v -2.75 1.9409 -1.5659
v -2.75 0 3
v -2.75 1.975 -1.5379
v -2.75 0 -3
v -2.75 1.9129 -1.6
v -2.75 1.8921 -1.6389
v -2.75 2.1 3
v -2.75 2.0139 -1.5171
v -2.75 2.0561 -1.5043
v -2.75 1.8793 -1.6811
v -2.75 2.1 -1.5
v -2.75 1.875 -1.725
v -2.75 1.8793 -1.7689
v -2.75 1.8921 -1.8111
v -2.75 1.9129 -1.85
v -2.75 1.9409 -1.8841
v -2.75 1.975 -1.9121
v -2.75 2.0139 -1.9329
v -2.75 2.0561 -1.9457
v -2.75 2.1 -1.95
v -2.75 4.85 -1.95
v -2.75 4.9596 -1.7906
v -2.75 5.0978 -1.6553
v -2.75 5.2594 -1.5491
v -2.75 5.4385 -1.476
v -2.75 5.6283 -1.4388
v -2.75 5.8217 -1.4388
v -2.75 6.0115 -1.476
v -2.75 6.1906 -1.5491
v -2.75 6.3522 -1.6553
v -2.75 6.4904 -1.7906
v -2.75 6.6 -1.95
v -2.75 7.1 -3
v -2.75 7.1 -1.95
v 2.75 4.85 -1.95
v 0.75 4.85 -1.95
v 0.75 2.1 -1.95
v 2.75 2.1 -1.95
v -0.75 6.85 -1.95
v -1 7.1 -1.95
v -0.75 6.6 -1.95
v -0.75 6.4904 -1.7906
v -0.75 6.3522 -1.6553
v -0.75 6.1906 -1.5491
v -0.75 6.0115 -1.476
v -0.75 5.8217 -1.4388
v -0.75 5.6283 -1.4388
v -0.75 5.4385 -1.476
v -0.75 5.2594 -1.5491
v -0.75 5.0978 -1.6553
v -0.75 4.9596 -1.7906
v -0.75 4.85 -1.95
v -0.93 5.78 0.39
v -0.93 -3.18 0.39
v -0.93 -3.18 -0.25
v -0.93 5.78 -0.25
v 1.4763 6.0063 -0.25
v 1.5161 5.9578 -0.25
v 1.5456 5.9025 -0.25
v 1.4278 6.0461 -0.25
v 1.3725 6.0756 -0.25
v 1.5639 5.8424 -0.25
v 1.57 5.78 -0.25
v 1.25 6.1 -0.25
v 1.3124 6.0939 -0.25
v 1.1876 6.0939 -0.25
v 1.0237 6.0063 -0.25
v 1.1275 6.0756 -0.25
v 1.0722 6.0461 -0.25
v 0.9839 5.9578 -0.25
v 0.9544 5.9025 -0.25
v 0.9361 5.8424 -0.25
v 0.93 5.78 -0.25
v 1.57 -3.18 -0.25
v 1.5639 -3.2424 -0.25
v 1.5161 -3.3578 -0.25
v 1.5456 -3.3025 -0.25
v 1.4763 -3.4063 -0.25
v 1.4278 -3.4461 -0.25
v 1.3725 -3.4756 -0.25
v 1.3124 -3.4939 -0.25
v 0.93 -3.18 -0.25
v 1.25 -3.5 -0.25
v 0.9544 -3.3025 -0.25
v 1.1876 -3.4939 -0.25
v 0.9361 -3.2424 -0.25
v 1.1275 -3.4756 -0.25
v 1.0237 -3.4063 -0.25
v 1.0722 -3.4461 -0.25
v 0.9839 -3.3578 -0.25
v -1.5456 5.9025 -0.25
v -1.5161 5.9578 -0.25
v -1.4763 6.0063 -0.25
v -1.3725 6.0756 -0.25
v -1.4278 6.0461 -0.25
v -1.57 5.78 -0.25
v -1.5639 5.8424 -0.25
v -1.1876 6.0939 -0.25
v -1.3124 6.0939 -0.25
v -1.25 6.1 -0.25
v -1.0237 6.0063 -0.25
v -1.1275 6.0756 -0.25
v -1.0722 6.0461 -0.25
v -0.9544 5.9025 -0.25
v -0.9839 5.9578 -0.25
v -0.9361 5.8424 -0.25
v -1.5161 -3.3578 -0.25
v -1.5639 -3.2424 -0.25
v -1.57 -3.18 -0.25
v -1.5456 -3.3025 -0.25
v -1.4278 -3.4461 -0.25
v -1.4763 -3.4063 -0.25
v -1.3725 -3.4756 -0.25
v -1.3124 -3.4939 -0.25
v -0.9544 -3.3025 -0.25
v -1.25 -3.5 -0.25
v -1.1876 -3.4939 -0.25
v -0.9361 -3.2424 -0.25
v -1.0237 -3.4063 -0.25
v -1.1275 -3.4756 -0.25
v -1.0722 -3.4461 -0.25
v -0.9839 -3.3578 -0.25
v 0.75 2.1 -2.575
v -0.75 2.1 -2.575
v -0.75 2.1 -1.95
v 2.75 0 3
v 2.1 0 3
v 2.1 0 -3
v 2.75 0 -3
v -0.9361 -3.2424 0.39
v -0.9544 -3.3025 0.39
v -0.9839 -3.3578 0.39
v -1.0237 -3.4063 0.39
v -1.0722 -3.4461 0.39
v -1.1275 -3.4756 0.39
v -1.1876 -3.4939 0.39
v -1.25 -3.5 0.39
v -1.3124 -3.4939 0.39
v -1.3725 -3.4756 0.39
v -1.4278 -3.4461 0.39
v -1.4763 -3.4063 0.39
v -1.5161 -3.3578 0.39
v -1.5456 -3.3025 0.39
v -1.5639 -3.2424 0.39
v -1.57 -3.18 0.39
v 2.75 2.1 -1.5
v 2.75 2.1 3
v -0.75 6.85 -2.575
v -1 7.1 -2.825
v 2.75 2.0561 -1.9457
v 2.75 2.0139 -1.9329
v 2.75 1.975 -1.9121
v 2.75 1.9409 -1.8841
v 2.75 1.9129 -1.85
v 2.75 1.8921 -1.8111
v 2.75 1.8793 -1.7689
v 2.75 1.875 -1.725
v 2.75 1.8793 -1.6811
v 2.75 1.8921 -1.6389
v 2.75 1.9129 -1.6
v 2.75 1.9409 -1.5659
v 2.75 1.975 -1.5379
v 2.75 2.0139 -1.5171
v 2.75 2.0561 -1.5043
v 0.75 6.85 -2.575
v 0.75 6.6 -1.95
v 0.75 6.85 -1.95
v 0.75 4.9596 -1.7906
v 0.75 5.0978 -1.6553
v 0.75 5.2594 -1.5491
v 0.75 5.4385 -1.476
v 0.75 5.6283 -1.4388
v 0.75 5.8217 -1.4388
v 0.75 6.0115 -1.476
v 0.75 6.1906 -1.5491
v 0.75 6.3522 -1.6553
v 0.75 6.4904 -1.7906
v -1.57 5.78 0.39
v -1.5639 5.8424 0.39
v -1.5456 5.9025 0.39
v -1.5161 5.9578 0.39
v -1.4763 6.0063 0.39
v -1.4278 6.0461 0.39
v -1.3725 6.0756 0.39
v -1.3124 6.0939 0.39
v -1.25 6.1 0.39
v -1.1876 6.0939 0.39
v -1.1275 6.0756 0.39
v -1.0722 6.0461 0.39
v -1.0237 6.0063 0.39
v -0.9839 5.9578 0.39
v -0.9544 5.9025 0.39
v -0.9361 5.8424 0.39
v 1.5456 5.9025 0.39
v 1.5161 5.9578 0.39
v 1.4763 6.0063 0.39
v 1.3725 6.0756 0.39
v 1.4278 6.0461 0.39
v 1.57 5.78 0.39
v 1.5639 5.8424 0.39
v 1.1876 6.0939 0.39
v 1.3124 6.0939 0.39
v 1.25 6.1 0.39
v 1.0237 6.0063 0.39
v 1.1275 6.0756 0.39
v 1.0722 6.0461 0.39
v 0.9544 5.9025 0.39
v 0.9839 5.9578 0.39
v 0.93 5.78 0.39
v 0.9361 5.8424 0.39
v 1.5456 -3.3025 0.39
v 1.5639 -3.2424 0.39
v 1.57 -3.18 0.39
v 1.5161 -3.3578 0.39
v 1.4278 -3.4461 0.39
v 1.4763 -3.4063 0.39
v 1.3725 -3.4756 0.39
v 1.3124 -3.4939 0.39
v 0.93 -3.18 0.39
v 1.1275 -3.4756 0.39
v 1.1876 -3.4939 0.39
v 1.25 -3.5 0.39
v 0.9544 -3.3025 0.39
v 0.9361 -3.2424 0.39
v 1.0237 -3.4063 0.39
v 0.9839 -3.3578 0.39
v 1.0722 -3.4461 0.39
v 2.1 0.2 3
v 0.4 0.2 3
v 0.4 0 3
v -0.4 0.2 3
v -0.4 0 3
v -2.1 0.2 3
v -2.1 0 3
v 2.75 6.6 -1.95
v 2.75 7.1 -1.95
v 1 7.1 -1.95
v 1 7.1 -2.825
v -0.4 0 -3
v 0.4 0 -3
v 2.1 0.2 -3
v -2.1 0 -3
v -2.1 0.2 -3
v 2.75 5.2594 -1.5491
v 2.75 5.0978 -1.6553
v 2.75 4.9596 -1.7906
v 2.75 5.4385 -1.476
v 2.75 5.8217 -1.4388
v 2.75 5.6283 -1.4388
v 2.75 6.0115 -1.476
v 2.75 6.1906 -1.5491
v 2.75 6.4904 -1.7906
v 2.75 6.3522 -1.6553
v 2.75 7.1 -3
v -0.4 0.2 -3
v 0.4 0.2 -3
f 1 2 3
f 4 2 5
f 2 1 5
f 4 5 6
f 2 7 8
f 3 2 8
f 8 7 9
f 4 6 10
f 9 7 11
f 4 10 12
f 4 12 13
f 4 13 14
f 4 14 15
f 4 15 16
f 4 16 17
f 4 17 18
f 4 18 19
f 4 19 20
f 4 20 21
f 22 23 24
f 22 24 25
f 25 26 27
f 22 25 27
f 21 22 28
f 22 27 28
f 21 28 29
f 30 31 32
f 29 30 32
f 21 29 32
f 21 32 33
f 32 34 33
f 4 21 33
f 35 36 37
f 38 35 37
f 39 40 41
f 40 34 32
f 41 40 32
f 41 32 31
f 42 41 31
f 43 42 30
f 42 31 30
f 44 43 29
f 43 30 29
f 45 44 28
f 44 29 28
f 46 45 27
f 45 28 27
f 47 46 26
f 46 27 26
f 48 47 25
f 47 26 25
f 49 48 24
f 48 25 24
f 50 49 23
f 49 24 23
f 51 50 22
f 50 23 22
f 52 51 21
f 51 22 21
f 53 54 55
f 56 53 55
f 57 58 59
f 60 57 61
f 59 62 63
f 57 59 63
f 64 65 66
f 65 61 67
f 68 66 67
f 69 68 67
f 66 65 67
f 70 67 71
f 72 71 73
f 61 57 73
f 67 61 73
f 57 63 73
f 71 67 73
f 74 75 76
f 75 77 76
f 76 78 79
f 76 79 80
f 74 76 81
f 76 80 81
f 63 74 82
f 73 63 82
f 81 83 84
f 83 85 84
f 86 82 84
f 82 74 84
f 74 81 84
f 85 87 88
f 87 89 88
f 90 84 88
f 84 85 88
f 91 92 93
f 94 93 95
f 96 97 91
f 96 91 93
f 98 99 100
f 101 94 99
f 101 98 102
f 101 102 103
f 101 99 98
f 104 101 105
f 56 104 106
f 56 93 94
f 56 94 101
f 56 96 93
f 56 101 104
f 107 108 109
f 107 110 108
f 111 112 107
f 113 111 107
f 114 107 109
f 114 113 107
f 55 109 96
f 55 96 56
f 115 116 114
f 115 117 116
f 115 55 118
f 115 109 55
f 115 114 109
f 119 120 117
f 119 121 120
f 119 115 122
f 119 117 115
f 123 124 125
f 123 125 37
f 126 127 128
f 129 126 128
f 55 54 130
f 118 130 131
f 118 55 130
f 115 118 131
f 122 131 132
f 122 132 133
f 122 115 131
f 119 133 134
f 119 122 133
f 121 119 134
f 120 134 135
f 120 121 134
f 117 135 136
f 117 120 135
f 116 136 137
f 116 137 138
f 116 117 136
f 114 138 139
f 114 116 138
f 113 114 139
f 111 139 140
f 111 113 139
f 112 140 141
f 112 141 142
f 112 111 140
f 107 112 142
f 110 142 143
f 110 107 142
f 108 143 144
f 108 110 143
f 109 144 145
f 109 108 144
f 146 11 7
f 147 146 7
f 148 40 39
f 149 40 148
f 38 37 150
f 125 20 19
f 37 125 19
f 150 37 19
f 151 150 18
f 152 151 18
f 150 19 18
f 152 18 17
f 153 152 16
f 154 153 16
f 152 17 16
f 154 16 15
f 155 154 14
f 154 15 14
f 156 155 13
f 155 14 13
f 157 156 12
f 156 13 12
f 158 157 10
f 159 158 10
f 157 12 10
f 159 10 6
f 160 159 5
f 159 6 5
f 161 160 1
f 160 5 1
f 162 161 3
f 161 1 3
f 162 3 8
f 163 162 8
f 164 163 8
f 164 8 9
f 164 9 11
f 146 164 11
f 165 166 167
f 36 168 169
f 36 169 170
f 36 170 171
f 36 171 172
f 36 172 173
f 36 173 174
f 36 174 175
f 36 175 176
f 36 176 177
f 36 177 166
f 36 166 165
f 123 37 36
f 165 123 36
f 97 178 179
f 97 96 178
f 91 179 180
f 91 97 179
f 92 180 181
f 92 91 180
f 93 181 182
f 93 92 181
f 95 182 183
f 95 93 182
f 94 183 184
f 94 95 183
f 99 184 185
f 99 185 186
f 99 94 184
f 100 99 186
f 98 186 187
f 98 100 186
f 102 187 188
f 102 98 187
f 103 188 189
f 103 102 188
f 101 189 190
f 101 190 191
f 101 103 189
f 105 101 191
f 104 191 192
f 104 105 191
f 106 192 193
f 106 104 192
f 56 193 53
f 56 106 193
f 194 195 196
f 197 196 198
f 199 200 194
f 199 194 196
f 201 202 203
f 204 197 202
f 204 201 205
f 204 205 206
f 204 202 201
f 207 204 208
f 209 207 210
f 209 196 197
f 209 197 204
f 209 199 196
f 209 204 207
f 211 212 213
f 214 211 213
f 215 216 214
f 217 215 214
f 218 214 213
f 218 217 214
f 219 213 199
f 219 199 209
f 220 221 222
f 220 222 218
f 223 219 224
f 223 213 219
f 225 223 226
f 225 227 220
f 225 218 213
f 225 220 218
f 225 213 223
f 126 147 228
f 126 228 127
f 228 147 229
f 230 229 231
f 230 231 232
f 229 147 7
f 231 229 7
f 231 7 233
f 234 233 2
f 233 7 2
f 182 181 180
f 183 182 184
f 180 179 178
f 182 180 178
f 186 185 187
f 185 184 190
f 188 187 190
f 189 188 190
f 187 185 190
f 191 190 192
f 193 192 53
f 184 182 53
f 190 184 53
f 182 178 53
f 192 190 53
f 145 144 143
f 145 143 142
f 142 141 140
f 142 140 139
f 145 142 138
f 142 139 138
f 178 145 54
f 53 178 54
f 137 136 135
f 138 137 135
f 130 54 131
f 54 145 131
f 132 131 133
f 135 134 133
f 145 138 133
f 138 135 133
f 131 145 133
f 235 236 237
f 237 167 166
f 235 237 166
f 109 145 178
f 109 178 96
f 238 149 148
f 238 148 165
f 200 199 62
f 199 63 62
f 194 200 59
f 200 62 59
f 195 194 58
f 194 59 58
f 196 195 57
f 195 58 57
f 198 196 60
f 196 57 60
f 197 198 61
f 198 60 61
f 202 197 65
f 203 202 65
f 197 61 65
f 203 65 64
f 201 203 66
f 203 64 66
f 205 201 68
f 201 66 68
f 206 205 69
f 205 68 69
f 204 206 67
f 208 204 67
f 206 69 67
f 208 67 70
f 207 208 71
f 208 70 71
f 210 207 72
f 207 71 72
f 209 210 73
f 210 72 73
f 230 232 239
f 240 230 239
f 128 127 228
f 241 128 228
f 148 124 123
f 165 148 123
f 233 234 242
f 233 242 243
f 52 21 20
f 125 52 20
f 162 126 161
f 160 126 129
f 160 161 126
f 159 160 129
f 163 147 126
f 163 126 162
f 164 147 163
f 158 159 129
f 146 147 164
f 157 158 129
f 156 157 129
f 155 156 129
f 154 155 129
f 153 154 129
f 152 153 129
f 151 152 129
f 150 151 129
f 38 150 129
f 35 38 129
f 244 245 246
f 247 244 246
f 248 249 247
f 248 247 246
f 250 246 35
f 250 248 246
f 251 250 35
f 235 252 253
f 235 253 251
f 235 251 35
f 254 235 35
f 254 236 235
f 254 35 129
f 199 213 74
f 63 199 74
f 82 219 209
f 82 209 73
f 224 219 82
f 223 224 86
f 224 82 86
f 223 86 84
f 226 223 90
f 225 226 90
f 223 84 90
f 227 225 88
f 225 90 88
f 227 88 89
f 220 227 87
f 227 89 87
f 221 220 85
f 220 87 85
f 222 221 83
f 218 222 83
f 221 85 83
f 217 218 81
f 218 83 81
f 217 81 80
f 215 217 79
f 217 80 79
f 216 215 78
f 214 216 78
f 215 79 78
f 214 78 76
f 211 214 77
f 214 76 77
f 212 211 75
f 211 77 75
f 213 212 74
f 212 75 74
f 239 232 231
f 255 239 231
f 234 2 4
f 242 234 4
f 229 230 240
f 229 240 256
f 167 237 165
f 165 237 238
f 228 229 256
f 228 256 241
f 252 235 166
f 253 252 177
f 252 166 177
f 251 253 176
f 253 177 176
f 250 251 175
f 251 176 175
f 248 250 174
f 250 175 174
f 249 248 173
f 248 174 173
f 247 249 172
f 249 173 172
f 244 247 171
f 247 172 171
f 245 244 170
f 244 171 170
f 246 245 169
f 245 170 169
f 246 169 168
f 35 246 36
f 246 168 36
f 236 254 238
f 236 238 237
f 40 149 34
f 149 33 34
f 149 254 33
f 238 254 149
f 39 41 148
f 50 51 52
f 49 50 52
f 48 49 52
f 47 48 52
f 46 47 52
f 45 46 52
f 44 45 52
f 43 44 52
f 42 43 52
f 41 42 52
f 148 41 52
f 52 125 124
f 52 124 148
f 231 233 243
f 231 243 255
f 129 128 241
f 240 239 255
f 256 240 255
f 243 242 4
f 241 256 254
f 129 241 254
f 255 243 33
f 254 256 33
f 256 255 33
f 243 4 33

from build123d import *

# Parameters (mm, degrees)
BOSS_EXTRUDE1_DEPTH      = 2.75
BOSS_EXTRUDE1_DEPTH_BACK = 2.75
SKETCH2_W                = 1.5
SKETCH2_H                = 1.25
CUT_EXTRUDE1_DEPTH       = 7.446898479
CHAMFER1_SIZE            = 0.25
SKETCH3_W                = 1.7
SKETCH3_H                = 0.2
CUT_EXTRUDE2_DEPTH       = 10.693941407
BOSS_EXTRUDE2_DEPTH      = 4
BOSS_EXTRUDE2_DEPTH_BACK = 5.6
SKETCH4_W                = 0.64
SKETCH4_H                = 0.64
FILLET1_RADIUS           = 0.32
FILLET1_LENGTH           = 0.64
FILLET2_RADIUS           = 0.32
FILLET2_LENGTH           = 0.64


with BuildPart() as part:
    # Sketch1 → Boss-Extrude1 (new, two sides: drawn at the far end of the back side and taken through both)
    with BuildSketch(Plane(origin=(0, 0, 0), x_dir=(0, 0, -1), z_dir=(1, 0, 0)).offset(-BOSS_EXTRUDE1_DEPTH_BACK)):
        with BuildLine():
            Line((-3, 0), (3, 0))
            Line((3, 0), (3, 7.1))
            Line((3, 7.1), (1.95, 7.1))
            Line((1.95, 7.1), (1.95, 6.6))
            ThreePointArc((1.95, 6.6), (1.434122918, 5.725), (1.95, 4.85))
            Line((1.95, 4.85), (1.95, 2.1))
            ThreePointArc((1.95, 2.1), (1.725, 1.875), (1.5, 2.1))
            Line((1.5, 2.1), (-3, 2.1))
            Line((-3, 2.1), (-3, 0))
        make_face()
    extrude(amount=BOSS_EXTRUDE1_DEPTH + BOSS_EXTRUDE1_DEPTH_BACK)

    # Sketch2 → Cut-Extrude1 (cut, through all)
    with BuildSketch(Plane(origin=(0, 2.1, 0), x_dir=(1, 0, 0), z_dir=(0, 1, 0))):
        with Locations((0, 1.95)):
            Rectangle(SKETCH2_W, SKETCH2_H)
    extrude(amount=CUT_EXTRUDE1_DEPTH, mode=Mode.SUBTRACT)

    # Chamfer1
    chamfer1_edges = [part.edges().sort_by_distance(p)[0] for p in [
        (0.75, 7.1, -2.2625),
        (-0.75, 7.1, -2.2625),
        (0, 7.1, -2.575),
    ]]
    chamfer(chamfer1_edges, length=CHAMFER1_SIZE)

    # Sketch3 → Cut-Extrude2 (cut, through all)
    with BuildSketch(Plane.XY.offset(3)):
        with Locations((-1.25, 0.1)):
            Rectangle(SKETCH3_W, SKETCH3_H)
        with Locations((1.25, 0.1)):
            Rectangle(SKETCH3_W, SKETCH3_H)
    extrude(amount=-CUT_EXTRUDE2_DEPTH, mode=Mode.SUBTRACT)


with BuildPart() as body_2:
    # Sketch4 → Boss-Extrude2 (new, two sides: drawn at the far end of the back side and taken through both)
    with BuildSketch(Plane(origin=(0, 2.1, 0), x_dir=(1, 0, 0), z_dir=(0, 1, 0)).offset(-BOSS_EXTRUDE2_DEPTH_BACK)):
        with Locations((-1.25, -0.07)):
            Rectangle(SKETCH4_W, SKETCH4_H)
    extrude(amount=BOSS_EXTRUDE2_DEPTH + BOSS_EXTRUDE2_DEPTH_BACK)

    # Fillet1: full round fillet: the end face becomes a half cylinder, R = half its width
    fillet1_face = Plane((-1.25, 6.1, 0.07), x_dir=(0, 0, -1), z_dir=(0, 1, 0))  # on the end face: x along it, z out of the body
    fillet1_slab = fillet1_face.offset(-FILLET1_RADIUS / 2) * Box(FILLET1_LENGTH, 2 * FILLET1_RADIUS, FILLET1_RADIUS, mode=Mode.PRIVATE)  # the body's end, R deep
    fillet1_round = Plane((-1.25, 5.78, 0.07), x_dir=(0, 1, 0), z_dir=(0, 0, -1)) * Cylinder(FILLET1_RADIUS, FILLET1_LENGTH, mode=Mode.PRIVATE)  # its axis R under the face
    add(fillet1_slab - fillet1_round, mode=Mode.SUBTRACT)

    # Fillet2: full round fillet: the end face becomes a half cylinder, R = half its width
    fillet2_face = Plane((-1.25, -3.5, 0.07), x_dir=(0, 0, -1), z_dir=(0, -1, 0))  # on the end face: x along it, z out of the body
    fillet2_slab = fillet2_face.offset(-FILLET2_RADIUS / 2) * Box(FILLET2_LENGTH, 2 * FILLET2_RADIUS, FILLET2_RADIUS, mode=Mode.PRIVATE)  # the body's end, R deep
    fillet2_round = Plane((-1.25, -3.18, 0.07), x_dir=(0, -1, 0), z_dir=(0, 0, -1)) * Cylinder(FILLET2_RADIUS, FILLET2_LENGTH, mode=Mode.PRIVATE)  # its axis R under the face
    add(fillet2_slab - fillet2_round, mode=Mode.SUBTRACT)


with BuildPart() as body_3:
    # Mirror1: mirrored copy
    add(body_2.part.mirror(Plane(origin=(0, 0, 0), x_dir=(0, 0, 1), z_dir=(1, 0, 0))))


solid = Compound([part.part, body_2.part, body_3.part])
